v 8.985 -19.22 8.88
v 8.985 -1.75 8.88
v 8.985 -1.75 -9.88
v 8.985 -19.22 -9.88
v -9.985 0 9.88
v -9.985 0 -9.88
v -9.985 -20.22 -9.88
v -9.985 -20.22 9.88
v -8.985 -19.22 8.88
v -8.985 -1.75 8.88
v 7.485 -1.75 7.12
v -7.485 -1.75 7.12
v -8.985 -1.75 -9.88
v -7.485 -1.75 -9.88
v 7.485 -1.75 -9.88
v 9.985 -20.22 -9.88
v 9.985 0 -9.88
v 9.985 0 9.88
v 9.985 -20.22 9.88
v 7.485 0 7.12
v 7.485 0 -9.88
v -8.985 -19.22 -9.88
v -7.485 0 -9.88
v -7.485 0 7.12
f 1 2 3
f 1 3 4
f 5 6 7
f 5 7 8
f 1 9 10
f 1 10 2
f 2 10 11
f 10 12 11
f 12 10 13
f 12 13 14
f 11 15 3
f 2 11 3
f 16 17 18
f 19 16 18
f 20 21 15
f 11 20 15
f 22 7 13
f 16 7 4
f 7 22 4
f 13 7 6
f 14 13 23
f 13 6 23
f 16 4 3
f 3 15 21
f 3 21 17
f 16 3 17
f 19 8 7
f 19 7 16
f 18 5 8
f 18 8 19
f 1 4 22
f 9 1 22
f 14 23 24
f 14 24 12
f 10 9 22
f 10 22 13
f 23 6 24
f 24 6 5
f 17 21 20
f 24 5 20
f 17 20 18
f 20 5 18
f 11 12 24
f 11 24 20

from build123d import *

# Parameters (mm, degrees)
F0_W     = 19.97
F0_H     = 19.76
F1_DEPTH = 20.22
F3_DEPTH = 18.76
F2_W     = 14.97
F2_H     = 1.75
F4_DEPTH = 17


with BuildPart() as f1:
    # F0 (on Front) → F1 (new body)
    with BuildSketch(Plane.XZ):
        Rectangle(F0_W, F0_H)
    extrude(amount=F1_DEPTH)

    # F2 (on face) → F3 (cut)
    with BuildSketch(Plane(origin=(0, 0, -9.88), x_dir=(1, 0, 0), z_dir=(0, 0, -1))):
        Polygon((8.985, 1.75), (8.985, 19.22), (-8.985, 19.22), (-8.985, 1.75), (-7.485, 1.75), (7.485, 1.75), align=None)
    extrude(amount=-F3_DEPTH, mode=Mode.SUBTRACT)

    # F2 (on face) → F4 (cut)
    with BuildSketch(Plane(origin=(0, 0, -9.88), x_dir=(1, 0, 0), z_dir=(0, 0, -1))):
        with Locations((0, 0.875)):
            Rectangle(F2_W, F2_H)
        Polygon((8.985, 1.75), (8.985, 19.22), (-8.985, 19.22), (-8.985, 1.75), (-7.485, 1.75), (7.485, 1.75), align=None)
    extrude(amount=-F4_DEPTH, mode=Mode.SUBTRACT)


solid = f1.part
